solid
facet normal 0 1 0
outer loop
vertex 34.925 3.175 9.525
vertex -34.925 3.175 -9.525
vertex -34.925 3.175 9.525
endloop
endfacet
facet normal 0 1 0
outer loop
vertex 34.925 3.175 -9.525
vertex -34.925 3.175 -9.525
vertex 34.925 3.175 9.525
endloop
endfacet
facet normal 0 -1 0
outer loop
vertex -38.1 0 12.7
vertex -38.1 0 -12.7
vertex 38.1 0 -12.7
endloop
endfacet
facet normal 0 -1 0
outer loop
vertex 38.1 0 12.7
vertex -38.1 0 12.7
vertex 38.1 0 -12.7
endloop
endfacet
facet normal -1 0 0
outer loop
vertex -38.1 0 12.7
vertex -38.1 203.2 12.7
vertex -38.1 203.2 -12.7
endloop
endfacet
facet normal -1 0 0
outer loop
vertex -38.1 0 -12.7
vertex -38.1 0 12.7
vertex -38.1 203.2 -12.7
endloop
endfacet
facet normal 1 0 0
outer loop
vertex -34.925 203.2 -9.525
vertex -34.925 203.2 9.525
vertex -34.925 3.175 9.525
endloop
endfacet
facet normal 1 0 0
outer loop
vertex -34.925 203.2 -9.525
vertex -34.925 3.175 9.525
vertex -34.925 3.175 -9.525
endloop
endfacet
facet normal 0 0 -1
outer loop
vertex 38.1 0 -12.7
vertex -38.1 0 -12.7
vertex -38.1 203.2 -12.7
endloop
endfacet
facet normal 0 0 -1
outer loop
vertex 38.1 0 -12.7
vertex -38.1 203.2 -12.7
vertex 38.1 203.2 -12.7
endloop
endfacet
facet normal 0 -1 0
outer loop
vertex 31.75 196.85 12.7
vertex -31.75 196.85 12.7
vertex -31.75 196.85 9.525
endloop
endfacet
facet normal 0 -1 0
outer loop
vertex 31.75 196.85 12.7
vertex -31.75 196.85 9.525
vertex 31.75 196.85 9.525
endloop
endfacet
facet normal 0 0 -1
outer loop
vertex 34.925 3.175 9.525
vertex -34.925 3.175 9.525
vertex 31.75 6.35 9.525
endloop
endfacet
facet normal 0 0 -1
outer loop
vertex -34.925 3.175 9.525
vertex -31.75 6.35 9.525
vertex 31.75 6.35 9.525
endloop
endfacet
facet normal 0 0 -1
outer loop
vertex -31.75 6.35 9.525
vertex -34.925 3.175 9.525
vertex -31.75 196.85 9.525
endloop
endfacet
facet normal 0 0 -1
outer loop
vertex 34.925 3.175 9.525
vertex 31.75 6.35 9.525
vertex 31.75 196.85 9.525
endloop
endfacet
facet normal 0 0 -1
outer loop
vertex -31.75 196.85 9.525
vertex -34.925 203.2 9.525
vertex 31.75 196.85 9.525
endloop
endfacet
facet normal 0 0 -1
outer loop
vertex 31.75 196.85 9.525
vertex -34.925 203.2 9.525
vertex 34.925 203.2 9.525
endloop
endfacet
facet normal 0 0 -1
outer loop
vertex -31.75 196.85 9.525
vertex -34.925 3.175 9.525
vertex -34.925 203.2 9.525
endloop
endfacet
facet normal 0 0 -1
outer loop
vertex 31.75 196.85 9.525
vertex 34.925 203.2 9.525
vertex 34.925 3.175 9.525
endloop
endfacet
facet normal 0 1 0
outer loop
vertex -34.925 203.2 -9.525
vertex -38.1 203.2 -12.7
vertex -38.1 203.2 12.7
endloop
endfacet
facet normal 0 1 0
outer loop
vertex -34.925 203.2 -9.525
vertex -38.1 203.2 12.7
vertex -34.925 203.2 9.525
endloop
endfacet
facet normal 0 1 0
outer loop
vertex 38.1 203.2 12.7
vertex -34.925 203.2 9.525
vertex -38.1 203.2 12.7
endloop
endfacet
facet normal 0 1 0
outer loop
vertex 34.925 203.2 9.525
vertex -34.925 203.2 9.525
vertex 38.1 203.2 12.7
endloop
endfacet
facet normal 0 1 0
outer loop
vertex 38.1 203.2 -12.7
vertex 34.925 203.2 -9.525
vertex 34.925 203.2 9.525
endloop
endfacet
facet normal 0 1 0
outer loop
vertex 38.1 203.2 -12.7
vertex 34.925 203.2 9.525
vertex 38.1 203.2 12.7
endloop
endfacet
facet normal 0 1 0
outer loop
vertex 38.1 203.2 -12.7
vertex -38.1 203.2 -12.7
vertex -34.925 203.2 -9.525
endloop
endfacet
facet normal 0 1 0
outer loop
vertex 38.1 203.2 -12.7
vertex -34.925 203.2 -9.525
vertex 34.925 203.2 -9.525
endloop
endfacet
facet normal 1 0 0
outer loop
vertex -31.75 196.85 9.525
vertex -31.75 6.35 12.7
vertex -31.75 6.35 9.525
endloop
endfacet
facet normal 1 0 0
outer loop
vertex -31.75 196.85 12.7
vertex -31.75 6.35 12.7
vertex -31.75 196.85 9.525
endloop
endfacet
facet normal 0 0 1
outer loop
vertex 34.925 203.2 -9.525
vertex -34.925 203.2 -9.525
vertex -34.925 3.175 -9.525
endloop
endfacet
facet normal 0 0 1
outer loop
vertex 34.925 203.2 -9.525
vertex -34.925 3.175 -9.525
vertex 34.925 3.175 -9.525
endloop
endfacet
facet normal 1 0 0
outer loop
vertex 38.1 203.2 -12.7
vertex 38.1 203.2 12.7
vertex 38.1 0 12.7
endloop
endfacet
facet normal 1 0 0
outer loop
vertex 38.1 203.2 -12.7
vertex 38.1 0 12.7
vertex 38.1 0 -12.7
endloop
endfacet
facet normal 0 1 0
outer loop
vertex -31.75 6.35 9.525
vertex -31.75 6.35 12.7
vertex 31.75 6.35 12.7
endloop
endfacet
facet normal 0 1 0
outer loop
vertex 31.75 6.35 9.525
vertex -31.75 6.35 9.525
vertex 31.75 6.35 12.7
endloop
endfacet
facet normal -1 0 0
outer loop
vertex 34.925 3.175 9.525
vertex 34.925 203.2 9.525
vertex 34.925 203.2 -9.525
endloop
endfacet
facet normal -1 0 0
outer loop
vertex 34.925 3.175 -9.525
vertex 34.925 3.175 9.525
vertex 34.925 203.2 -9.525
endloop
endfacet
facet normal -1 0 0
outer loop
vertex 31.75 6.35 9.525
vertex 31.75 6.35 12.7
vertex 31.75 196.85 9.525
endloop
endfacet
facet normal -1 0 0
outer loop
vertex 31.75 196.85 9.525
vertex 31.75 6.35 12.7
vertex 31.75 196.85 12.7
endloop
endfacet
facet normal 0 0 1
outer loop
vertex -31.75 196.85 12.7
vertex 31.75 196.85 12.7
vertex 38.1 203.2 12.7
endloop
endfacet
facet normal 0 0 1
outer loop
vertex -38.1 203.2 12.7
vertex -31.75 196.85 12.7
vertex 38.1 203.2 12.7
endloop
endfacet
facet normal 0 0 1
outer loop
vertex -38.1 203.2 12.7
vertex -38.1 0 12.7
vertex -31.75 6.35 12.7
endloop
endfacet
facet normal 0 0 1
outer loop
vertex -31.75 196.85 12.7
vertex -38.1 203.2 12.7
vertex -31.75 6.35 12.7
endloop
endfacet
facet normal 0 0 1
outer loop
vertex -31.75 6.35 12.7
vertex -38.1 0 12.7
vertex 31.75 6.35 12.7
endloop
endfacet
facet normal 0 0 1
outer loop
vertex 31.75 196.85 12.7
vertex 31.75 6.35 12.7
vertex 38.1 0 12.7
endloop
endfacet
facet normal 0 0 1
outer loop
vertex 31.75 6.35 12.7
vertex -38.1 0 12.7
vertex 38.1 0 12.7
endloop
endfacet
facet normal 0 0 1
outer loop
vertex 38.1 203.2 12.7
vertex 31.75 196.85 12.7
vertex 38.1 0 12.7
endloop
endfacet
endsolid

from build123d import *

# Parameters (mm, degrees)
SKETCH1_W           = 76.2
SKETCH1_H           = 25.4
BOSS_EXTRUDE5_DEPTH = 203.2
SKETCH4_W           = 69.85
SKETCH4_H           = 19.05
CUT_EXTRUDE1_DEPTH  = 200.025
SKETCH5_W           = 63.5
SKETCH5_H           = 190.5
CUT_EXTRUDE2_DEPTH  = 8.89


with BuildPart() as part:
    # Sketch1 → Boss-Extrude5 (new body)
    with BuildSketch(Plane(origin=(0, 0, 0), x_dir=(1, 0, 0), z_dir=(0, 1, 0))):
        Rectangle(SKETCH1_W, SKETCH1_H)
    extrude(amount=BOSS_EXTRUDE5_DEPTH)

    # Sketch4 → Cut-Extrude1 (cut)
    with BuildSketch(Plane(origin=(0, 203.2, 0), x_dir=(1, 0, 0), z_dir=(0, 1, 0))):
        Rectangle(SKETCH4_W, SKETCH4_H)
    extrude(amount=-CUT_EXTRUDE1_DEPTH, mode=Mode.SUBTRACT)

    # Sketch5 → Cut-Extrude2 (cut)
    with BuildSketch(Plane.XY.offset(12.7)):
        with Locations((0, 101.6)):
            Rectangle(SKETCH5_W, SKETCH5_H)
    extrude(amount=-CUT_EXTRUDE2_DEPTH, mode=Mode.SUBTRACT)


solid = part.part
